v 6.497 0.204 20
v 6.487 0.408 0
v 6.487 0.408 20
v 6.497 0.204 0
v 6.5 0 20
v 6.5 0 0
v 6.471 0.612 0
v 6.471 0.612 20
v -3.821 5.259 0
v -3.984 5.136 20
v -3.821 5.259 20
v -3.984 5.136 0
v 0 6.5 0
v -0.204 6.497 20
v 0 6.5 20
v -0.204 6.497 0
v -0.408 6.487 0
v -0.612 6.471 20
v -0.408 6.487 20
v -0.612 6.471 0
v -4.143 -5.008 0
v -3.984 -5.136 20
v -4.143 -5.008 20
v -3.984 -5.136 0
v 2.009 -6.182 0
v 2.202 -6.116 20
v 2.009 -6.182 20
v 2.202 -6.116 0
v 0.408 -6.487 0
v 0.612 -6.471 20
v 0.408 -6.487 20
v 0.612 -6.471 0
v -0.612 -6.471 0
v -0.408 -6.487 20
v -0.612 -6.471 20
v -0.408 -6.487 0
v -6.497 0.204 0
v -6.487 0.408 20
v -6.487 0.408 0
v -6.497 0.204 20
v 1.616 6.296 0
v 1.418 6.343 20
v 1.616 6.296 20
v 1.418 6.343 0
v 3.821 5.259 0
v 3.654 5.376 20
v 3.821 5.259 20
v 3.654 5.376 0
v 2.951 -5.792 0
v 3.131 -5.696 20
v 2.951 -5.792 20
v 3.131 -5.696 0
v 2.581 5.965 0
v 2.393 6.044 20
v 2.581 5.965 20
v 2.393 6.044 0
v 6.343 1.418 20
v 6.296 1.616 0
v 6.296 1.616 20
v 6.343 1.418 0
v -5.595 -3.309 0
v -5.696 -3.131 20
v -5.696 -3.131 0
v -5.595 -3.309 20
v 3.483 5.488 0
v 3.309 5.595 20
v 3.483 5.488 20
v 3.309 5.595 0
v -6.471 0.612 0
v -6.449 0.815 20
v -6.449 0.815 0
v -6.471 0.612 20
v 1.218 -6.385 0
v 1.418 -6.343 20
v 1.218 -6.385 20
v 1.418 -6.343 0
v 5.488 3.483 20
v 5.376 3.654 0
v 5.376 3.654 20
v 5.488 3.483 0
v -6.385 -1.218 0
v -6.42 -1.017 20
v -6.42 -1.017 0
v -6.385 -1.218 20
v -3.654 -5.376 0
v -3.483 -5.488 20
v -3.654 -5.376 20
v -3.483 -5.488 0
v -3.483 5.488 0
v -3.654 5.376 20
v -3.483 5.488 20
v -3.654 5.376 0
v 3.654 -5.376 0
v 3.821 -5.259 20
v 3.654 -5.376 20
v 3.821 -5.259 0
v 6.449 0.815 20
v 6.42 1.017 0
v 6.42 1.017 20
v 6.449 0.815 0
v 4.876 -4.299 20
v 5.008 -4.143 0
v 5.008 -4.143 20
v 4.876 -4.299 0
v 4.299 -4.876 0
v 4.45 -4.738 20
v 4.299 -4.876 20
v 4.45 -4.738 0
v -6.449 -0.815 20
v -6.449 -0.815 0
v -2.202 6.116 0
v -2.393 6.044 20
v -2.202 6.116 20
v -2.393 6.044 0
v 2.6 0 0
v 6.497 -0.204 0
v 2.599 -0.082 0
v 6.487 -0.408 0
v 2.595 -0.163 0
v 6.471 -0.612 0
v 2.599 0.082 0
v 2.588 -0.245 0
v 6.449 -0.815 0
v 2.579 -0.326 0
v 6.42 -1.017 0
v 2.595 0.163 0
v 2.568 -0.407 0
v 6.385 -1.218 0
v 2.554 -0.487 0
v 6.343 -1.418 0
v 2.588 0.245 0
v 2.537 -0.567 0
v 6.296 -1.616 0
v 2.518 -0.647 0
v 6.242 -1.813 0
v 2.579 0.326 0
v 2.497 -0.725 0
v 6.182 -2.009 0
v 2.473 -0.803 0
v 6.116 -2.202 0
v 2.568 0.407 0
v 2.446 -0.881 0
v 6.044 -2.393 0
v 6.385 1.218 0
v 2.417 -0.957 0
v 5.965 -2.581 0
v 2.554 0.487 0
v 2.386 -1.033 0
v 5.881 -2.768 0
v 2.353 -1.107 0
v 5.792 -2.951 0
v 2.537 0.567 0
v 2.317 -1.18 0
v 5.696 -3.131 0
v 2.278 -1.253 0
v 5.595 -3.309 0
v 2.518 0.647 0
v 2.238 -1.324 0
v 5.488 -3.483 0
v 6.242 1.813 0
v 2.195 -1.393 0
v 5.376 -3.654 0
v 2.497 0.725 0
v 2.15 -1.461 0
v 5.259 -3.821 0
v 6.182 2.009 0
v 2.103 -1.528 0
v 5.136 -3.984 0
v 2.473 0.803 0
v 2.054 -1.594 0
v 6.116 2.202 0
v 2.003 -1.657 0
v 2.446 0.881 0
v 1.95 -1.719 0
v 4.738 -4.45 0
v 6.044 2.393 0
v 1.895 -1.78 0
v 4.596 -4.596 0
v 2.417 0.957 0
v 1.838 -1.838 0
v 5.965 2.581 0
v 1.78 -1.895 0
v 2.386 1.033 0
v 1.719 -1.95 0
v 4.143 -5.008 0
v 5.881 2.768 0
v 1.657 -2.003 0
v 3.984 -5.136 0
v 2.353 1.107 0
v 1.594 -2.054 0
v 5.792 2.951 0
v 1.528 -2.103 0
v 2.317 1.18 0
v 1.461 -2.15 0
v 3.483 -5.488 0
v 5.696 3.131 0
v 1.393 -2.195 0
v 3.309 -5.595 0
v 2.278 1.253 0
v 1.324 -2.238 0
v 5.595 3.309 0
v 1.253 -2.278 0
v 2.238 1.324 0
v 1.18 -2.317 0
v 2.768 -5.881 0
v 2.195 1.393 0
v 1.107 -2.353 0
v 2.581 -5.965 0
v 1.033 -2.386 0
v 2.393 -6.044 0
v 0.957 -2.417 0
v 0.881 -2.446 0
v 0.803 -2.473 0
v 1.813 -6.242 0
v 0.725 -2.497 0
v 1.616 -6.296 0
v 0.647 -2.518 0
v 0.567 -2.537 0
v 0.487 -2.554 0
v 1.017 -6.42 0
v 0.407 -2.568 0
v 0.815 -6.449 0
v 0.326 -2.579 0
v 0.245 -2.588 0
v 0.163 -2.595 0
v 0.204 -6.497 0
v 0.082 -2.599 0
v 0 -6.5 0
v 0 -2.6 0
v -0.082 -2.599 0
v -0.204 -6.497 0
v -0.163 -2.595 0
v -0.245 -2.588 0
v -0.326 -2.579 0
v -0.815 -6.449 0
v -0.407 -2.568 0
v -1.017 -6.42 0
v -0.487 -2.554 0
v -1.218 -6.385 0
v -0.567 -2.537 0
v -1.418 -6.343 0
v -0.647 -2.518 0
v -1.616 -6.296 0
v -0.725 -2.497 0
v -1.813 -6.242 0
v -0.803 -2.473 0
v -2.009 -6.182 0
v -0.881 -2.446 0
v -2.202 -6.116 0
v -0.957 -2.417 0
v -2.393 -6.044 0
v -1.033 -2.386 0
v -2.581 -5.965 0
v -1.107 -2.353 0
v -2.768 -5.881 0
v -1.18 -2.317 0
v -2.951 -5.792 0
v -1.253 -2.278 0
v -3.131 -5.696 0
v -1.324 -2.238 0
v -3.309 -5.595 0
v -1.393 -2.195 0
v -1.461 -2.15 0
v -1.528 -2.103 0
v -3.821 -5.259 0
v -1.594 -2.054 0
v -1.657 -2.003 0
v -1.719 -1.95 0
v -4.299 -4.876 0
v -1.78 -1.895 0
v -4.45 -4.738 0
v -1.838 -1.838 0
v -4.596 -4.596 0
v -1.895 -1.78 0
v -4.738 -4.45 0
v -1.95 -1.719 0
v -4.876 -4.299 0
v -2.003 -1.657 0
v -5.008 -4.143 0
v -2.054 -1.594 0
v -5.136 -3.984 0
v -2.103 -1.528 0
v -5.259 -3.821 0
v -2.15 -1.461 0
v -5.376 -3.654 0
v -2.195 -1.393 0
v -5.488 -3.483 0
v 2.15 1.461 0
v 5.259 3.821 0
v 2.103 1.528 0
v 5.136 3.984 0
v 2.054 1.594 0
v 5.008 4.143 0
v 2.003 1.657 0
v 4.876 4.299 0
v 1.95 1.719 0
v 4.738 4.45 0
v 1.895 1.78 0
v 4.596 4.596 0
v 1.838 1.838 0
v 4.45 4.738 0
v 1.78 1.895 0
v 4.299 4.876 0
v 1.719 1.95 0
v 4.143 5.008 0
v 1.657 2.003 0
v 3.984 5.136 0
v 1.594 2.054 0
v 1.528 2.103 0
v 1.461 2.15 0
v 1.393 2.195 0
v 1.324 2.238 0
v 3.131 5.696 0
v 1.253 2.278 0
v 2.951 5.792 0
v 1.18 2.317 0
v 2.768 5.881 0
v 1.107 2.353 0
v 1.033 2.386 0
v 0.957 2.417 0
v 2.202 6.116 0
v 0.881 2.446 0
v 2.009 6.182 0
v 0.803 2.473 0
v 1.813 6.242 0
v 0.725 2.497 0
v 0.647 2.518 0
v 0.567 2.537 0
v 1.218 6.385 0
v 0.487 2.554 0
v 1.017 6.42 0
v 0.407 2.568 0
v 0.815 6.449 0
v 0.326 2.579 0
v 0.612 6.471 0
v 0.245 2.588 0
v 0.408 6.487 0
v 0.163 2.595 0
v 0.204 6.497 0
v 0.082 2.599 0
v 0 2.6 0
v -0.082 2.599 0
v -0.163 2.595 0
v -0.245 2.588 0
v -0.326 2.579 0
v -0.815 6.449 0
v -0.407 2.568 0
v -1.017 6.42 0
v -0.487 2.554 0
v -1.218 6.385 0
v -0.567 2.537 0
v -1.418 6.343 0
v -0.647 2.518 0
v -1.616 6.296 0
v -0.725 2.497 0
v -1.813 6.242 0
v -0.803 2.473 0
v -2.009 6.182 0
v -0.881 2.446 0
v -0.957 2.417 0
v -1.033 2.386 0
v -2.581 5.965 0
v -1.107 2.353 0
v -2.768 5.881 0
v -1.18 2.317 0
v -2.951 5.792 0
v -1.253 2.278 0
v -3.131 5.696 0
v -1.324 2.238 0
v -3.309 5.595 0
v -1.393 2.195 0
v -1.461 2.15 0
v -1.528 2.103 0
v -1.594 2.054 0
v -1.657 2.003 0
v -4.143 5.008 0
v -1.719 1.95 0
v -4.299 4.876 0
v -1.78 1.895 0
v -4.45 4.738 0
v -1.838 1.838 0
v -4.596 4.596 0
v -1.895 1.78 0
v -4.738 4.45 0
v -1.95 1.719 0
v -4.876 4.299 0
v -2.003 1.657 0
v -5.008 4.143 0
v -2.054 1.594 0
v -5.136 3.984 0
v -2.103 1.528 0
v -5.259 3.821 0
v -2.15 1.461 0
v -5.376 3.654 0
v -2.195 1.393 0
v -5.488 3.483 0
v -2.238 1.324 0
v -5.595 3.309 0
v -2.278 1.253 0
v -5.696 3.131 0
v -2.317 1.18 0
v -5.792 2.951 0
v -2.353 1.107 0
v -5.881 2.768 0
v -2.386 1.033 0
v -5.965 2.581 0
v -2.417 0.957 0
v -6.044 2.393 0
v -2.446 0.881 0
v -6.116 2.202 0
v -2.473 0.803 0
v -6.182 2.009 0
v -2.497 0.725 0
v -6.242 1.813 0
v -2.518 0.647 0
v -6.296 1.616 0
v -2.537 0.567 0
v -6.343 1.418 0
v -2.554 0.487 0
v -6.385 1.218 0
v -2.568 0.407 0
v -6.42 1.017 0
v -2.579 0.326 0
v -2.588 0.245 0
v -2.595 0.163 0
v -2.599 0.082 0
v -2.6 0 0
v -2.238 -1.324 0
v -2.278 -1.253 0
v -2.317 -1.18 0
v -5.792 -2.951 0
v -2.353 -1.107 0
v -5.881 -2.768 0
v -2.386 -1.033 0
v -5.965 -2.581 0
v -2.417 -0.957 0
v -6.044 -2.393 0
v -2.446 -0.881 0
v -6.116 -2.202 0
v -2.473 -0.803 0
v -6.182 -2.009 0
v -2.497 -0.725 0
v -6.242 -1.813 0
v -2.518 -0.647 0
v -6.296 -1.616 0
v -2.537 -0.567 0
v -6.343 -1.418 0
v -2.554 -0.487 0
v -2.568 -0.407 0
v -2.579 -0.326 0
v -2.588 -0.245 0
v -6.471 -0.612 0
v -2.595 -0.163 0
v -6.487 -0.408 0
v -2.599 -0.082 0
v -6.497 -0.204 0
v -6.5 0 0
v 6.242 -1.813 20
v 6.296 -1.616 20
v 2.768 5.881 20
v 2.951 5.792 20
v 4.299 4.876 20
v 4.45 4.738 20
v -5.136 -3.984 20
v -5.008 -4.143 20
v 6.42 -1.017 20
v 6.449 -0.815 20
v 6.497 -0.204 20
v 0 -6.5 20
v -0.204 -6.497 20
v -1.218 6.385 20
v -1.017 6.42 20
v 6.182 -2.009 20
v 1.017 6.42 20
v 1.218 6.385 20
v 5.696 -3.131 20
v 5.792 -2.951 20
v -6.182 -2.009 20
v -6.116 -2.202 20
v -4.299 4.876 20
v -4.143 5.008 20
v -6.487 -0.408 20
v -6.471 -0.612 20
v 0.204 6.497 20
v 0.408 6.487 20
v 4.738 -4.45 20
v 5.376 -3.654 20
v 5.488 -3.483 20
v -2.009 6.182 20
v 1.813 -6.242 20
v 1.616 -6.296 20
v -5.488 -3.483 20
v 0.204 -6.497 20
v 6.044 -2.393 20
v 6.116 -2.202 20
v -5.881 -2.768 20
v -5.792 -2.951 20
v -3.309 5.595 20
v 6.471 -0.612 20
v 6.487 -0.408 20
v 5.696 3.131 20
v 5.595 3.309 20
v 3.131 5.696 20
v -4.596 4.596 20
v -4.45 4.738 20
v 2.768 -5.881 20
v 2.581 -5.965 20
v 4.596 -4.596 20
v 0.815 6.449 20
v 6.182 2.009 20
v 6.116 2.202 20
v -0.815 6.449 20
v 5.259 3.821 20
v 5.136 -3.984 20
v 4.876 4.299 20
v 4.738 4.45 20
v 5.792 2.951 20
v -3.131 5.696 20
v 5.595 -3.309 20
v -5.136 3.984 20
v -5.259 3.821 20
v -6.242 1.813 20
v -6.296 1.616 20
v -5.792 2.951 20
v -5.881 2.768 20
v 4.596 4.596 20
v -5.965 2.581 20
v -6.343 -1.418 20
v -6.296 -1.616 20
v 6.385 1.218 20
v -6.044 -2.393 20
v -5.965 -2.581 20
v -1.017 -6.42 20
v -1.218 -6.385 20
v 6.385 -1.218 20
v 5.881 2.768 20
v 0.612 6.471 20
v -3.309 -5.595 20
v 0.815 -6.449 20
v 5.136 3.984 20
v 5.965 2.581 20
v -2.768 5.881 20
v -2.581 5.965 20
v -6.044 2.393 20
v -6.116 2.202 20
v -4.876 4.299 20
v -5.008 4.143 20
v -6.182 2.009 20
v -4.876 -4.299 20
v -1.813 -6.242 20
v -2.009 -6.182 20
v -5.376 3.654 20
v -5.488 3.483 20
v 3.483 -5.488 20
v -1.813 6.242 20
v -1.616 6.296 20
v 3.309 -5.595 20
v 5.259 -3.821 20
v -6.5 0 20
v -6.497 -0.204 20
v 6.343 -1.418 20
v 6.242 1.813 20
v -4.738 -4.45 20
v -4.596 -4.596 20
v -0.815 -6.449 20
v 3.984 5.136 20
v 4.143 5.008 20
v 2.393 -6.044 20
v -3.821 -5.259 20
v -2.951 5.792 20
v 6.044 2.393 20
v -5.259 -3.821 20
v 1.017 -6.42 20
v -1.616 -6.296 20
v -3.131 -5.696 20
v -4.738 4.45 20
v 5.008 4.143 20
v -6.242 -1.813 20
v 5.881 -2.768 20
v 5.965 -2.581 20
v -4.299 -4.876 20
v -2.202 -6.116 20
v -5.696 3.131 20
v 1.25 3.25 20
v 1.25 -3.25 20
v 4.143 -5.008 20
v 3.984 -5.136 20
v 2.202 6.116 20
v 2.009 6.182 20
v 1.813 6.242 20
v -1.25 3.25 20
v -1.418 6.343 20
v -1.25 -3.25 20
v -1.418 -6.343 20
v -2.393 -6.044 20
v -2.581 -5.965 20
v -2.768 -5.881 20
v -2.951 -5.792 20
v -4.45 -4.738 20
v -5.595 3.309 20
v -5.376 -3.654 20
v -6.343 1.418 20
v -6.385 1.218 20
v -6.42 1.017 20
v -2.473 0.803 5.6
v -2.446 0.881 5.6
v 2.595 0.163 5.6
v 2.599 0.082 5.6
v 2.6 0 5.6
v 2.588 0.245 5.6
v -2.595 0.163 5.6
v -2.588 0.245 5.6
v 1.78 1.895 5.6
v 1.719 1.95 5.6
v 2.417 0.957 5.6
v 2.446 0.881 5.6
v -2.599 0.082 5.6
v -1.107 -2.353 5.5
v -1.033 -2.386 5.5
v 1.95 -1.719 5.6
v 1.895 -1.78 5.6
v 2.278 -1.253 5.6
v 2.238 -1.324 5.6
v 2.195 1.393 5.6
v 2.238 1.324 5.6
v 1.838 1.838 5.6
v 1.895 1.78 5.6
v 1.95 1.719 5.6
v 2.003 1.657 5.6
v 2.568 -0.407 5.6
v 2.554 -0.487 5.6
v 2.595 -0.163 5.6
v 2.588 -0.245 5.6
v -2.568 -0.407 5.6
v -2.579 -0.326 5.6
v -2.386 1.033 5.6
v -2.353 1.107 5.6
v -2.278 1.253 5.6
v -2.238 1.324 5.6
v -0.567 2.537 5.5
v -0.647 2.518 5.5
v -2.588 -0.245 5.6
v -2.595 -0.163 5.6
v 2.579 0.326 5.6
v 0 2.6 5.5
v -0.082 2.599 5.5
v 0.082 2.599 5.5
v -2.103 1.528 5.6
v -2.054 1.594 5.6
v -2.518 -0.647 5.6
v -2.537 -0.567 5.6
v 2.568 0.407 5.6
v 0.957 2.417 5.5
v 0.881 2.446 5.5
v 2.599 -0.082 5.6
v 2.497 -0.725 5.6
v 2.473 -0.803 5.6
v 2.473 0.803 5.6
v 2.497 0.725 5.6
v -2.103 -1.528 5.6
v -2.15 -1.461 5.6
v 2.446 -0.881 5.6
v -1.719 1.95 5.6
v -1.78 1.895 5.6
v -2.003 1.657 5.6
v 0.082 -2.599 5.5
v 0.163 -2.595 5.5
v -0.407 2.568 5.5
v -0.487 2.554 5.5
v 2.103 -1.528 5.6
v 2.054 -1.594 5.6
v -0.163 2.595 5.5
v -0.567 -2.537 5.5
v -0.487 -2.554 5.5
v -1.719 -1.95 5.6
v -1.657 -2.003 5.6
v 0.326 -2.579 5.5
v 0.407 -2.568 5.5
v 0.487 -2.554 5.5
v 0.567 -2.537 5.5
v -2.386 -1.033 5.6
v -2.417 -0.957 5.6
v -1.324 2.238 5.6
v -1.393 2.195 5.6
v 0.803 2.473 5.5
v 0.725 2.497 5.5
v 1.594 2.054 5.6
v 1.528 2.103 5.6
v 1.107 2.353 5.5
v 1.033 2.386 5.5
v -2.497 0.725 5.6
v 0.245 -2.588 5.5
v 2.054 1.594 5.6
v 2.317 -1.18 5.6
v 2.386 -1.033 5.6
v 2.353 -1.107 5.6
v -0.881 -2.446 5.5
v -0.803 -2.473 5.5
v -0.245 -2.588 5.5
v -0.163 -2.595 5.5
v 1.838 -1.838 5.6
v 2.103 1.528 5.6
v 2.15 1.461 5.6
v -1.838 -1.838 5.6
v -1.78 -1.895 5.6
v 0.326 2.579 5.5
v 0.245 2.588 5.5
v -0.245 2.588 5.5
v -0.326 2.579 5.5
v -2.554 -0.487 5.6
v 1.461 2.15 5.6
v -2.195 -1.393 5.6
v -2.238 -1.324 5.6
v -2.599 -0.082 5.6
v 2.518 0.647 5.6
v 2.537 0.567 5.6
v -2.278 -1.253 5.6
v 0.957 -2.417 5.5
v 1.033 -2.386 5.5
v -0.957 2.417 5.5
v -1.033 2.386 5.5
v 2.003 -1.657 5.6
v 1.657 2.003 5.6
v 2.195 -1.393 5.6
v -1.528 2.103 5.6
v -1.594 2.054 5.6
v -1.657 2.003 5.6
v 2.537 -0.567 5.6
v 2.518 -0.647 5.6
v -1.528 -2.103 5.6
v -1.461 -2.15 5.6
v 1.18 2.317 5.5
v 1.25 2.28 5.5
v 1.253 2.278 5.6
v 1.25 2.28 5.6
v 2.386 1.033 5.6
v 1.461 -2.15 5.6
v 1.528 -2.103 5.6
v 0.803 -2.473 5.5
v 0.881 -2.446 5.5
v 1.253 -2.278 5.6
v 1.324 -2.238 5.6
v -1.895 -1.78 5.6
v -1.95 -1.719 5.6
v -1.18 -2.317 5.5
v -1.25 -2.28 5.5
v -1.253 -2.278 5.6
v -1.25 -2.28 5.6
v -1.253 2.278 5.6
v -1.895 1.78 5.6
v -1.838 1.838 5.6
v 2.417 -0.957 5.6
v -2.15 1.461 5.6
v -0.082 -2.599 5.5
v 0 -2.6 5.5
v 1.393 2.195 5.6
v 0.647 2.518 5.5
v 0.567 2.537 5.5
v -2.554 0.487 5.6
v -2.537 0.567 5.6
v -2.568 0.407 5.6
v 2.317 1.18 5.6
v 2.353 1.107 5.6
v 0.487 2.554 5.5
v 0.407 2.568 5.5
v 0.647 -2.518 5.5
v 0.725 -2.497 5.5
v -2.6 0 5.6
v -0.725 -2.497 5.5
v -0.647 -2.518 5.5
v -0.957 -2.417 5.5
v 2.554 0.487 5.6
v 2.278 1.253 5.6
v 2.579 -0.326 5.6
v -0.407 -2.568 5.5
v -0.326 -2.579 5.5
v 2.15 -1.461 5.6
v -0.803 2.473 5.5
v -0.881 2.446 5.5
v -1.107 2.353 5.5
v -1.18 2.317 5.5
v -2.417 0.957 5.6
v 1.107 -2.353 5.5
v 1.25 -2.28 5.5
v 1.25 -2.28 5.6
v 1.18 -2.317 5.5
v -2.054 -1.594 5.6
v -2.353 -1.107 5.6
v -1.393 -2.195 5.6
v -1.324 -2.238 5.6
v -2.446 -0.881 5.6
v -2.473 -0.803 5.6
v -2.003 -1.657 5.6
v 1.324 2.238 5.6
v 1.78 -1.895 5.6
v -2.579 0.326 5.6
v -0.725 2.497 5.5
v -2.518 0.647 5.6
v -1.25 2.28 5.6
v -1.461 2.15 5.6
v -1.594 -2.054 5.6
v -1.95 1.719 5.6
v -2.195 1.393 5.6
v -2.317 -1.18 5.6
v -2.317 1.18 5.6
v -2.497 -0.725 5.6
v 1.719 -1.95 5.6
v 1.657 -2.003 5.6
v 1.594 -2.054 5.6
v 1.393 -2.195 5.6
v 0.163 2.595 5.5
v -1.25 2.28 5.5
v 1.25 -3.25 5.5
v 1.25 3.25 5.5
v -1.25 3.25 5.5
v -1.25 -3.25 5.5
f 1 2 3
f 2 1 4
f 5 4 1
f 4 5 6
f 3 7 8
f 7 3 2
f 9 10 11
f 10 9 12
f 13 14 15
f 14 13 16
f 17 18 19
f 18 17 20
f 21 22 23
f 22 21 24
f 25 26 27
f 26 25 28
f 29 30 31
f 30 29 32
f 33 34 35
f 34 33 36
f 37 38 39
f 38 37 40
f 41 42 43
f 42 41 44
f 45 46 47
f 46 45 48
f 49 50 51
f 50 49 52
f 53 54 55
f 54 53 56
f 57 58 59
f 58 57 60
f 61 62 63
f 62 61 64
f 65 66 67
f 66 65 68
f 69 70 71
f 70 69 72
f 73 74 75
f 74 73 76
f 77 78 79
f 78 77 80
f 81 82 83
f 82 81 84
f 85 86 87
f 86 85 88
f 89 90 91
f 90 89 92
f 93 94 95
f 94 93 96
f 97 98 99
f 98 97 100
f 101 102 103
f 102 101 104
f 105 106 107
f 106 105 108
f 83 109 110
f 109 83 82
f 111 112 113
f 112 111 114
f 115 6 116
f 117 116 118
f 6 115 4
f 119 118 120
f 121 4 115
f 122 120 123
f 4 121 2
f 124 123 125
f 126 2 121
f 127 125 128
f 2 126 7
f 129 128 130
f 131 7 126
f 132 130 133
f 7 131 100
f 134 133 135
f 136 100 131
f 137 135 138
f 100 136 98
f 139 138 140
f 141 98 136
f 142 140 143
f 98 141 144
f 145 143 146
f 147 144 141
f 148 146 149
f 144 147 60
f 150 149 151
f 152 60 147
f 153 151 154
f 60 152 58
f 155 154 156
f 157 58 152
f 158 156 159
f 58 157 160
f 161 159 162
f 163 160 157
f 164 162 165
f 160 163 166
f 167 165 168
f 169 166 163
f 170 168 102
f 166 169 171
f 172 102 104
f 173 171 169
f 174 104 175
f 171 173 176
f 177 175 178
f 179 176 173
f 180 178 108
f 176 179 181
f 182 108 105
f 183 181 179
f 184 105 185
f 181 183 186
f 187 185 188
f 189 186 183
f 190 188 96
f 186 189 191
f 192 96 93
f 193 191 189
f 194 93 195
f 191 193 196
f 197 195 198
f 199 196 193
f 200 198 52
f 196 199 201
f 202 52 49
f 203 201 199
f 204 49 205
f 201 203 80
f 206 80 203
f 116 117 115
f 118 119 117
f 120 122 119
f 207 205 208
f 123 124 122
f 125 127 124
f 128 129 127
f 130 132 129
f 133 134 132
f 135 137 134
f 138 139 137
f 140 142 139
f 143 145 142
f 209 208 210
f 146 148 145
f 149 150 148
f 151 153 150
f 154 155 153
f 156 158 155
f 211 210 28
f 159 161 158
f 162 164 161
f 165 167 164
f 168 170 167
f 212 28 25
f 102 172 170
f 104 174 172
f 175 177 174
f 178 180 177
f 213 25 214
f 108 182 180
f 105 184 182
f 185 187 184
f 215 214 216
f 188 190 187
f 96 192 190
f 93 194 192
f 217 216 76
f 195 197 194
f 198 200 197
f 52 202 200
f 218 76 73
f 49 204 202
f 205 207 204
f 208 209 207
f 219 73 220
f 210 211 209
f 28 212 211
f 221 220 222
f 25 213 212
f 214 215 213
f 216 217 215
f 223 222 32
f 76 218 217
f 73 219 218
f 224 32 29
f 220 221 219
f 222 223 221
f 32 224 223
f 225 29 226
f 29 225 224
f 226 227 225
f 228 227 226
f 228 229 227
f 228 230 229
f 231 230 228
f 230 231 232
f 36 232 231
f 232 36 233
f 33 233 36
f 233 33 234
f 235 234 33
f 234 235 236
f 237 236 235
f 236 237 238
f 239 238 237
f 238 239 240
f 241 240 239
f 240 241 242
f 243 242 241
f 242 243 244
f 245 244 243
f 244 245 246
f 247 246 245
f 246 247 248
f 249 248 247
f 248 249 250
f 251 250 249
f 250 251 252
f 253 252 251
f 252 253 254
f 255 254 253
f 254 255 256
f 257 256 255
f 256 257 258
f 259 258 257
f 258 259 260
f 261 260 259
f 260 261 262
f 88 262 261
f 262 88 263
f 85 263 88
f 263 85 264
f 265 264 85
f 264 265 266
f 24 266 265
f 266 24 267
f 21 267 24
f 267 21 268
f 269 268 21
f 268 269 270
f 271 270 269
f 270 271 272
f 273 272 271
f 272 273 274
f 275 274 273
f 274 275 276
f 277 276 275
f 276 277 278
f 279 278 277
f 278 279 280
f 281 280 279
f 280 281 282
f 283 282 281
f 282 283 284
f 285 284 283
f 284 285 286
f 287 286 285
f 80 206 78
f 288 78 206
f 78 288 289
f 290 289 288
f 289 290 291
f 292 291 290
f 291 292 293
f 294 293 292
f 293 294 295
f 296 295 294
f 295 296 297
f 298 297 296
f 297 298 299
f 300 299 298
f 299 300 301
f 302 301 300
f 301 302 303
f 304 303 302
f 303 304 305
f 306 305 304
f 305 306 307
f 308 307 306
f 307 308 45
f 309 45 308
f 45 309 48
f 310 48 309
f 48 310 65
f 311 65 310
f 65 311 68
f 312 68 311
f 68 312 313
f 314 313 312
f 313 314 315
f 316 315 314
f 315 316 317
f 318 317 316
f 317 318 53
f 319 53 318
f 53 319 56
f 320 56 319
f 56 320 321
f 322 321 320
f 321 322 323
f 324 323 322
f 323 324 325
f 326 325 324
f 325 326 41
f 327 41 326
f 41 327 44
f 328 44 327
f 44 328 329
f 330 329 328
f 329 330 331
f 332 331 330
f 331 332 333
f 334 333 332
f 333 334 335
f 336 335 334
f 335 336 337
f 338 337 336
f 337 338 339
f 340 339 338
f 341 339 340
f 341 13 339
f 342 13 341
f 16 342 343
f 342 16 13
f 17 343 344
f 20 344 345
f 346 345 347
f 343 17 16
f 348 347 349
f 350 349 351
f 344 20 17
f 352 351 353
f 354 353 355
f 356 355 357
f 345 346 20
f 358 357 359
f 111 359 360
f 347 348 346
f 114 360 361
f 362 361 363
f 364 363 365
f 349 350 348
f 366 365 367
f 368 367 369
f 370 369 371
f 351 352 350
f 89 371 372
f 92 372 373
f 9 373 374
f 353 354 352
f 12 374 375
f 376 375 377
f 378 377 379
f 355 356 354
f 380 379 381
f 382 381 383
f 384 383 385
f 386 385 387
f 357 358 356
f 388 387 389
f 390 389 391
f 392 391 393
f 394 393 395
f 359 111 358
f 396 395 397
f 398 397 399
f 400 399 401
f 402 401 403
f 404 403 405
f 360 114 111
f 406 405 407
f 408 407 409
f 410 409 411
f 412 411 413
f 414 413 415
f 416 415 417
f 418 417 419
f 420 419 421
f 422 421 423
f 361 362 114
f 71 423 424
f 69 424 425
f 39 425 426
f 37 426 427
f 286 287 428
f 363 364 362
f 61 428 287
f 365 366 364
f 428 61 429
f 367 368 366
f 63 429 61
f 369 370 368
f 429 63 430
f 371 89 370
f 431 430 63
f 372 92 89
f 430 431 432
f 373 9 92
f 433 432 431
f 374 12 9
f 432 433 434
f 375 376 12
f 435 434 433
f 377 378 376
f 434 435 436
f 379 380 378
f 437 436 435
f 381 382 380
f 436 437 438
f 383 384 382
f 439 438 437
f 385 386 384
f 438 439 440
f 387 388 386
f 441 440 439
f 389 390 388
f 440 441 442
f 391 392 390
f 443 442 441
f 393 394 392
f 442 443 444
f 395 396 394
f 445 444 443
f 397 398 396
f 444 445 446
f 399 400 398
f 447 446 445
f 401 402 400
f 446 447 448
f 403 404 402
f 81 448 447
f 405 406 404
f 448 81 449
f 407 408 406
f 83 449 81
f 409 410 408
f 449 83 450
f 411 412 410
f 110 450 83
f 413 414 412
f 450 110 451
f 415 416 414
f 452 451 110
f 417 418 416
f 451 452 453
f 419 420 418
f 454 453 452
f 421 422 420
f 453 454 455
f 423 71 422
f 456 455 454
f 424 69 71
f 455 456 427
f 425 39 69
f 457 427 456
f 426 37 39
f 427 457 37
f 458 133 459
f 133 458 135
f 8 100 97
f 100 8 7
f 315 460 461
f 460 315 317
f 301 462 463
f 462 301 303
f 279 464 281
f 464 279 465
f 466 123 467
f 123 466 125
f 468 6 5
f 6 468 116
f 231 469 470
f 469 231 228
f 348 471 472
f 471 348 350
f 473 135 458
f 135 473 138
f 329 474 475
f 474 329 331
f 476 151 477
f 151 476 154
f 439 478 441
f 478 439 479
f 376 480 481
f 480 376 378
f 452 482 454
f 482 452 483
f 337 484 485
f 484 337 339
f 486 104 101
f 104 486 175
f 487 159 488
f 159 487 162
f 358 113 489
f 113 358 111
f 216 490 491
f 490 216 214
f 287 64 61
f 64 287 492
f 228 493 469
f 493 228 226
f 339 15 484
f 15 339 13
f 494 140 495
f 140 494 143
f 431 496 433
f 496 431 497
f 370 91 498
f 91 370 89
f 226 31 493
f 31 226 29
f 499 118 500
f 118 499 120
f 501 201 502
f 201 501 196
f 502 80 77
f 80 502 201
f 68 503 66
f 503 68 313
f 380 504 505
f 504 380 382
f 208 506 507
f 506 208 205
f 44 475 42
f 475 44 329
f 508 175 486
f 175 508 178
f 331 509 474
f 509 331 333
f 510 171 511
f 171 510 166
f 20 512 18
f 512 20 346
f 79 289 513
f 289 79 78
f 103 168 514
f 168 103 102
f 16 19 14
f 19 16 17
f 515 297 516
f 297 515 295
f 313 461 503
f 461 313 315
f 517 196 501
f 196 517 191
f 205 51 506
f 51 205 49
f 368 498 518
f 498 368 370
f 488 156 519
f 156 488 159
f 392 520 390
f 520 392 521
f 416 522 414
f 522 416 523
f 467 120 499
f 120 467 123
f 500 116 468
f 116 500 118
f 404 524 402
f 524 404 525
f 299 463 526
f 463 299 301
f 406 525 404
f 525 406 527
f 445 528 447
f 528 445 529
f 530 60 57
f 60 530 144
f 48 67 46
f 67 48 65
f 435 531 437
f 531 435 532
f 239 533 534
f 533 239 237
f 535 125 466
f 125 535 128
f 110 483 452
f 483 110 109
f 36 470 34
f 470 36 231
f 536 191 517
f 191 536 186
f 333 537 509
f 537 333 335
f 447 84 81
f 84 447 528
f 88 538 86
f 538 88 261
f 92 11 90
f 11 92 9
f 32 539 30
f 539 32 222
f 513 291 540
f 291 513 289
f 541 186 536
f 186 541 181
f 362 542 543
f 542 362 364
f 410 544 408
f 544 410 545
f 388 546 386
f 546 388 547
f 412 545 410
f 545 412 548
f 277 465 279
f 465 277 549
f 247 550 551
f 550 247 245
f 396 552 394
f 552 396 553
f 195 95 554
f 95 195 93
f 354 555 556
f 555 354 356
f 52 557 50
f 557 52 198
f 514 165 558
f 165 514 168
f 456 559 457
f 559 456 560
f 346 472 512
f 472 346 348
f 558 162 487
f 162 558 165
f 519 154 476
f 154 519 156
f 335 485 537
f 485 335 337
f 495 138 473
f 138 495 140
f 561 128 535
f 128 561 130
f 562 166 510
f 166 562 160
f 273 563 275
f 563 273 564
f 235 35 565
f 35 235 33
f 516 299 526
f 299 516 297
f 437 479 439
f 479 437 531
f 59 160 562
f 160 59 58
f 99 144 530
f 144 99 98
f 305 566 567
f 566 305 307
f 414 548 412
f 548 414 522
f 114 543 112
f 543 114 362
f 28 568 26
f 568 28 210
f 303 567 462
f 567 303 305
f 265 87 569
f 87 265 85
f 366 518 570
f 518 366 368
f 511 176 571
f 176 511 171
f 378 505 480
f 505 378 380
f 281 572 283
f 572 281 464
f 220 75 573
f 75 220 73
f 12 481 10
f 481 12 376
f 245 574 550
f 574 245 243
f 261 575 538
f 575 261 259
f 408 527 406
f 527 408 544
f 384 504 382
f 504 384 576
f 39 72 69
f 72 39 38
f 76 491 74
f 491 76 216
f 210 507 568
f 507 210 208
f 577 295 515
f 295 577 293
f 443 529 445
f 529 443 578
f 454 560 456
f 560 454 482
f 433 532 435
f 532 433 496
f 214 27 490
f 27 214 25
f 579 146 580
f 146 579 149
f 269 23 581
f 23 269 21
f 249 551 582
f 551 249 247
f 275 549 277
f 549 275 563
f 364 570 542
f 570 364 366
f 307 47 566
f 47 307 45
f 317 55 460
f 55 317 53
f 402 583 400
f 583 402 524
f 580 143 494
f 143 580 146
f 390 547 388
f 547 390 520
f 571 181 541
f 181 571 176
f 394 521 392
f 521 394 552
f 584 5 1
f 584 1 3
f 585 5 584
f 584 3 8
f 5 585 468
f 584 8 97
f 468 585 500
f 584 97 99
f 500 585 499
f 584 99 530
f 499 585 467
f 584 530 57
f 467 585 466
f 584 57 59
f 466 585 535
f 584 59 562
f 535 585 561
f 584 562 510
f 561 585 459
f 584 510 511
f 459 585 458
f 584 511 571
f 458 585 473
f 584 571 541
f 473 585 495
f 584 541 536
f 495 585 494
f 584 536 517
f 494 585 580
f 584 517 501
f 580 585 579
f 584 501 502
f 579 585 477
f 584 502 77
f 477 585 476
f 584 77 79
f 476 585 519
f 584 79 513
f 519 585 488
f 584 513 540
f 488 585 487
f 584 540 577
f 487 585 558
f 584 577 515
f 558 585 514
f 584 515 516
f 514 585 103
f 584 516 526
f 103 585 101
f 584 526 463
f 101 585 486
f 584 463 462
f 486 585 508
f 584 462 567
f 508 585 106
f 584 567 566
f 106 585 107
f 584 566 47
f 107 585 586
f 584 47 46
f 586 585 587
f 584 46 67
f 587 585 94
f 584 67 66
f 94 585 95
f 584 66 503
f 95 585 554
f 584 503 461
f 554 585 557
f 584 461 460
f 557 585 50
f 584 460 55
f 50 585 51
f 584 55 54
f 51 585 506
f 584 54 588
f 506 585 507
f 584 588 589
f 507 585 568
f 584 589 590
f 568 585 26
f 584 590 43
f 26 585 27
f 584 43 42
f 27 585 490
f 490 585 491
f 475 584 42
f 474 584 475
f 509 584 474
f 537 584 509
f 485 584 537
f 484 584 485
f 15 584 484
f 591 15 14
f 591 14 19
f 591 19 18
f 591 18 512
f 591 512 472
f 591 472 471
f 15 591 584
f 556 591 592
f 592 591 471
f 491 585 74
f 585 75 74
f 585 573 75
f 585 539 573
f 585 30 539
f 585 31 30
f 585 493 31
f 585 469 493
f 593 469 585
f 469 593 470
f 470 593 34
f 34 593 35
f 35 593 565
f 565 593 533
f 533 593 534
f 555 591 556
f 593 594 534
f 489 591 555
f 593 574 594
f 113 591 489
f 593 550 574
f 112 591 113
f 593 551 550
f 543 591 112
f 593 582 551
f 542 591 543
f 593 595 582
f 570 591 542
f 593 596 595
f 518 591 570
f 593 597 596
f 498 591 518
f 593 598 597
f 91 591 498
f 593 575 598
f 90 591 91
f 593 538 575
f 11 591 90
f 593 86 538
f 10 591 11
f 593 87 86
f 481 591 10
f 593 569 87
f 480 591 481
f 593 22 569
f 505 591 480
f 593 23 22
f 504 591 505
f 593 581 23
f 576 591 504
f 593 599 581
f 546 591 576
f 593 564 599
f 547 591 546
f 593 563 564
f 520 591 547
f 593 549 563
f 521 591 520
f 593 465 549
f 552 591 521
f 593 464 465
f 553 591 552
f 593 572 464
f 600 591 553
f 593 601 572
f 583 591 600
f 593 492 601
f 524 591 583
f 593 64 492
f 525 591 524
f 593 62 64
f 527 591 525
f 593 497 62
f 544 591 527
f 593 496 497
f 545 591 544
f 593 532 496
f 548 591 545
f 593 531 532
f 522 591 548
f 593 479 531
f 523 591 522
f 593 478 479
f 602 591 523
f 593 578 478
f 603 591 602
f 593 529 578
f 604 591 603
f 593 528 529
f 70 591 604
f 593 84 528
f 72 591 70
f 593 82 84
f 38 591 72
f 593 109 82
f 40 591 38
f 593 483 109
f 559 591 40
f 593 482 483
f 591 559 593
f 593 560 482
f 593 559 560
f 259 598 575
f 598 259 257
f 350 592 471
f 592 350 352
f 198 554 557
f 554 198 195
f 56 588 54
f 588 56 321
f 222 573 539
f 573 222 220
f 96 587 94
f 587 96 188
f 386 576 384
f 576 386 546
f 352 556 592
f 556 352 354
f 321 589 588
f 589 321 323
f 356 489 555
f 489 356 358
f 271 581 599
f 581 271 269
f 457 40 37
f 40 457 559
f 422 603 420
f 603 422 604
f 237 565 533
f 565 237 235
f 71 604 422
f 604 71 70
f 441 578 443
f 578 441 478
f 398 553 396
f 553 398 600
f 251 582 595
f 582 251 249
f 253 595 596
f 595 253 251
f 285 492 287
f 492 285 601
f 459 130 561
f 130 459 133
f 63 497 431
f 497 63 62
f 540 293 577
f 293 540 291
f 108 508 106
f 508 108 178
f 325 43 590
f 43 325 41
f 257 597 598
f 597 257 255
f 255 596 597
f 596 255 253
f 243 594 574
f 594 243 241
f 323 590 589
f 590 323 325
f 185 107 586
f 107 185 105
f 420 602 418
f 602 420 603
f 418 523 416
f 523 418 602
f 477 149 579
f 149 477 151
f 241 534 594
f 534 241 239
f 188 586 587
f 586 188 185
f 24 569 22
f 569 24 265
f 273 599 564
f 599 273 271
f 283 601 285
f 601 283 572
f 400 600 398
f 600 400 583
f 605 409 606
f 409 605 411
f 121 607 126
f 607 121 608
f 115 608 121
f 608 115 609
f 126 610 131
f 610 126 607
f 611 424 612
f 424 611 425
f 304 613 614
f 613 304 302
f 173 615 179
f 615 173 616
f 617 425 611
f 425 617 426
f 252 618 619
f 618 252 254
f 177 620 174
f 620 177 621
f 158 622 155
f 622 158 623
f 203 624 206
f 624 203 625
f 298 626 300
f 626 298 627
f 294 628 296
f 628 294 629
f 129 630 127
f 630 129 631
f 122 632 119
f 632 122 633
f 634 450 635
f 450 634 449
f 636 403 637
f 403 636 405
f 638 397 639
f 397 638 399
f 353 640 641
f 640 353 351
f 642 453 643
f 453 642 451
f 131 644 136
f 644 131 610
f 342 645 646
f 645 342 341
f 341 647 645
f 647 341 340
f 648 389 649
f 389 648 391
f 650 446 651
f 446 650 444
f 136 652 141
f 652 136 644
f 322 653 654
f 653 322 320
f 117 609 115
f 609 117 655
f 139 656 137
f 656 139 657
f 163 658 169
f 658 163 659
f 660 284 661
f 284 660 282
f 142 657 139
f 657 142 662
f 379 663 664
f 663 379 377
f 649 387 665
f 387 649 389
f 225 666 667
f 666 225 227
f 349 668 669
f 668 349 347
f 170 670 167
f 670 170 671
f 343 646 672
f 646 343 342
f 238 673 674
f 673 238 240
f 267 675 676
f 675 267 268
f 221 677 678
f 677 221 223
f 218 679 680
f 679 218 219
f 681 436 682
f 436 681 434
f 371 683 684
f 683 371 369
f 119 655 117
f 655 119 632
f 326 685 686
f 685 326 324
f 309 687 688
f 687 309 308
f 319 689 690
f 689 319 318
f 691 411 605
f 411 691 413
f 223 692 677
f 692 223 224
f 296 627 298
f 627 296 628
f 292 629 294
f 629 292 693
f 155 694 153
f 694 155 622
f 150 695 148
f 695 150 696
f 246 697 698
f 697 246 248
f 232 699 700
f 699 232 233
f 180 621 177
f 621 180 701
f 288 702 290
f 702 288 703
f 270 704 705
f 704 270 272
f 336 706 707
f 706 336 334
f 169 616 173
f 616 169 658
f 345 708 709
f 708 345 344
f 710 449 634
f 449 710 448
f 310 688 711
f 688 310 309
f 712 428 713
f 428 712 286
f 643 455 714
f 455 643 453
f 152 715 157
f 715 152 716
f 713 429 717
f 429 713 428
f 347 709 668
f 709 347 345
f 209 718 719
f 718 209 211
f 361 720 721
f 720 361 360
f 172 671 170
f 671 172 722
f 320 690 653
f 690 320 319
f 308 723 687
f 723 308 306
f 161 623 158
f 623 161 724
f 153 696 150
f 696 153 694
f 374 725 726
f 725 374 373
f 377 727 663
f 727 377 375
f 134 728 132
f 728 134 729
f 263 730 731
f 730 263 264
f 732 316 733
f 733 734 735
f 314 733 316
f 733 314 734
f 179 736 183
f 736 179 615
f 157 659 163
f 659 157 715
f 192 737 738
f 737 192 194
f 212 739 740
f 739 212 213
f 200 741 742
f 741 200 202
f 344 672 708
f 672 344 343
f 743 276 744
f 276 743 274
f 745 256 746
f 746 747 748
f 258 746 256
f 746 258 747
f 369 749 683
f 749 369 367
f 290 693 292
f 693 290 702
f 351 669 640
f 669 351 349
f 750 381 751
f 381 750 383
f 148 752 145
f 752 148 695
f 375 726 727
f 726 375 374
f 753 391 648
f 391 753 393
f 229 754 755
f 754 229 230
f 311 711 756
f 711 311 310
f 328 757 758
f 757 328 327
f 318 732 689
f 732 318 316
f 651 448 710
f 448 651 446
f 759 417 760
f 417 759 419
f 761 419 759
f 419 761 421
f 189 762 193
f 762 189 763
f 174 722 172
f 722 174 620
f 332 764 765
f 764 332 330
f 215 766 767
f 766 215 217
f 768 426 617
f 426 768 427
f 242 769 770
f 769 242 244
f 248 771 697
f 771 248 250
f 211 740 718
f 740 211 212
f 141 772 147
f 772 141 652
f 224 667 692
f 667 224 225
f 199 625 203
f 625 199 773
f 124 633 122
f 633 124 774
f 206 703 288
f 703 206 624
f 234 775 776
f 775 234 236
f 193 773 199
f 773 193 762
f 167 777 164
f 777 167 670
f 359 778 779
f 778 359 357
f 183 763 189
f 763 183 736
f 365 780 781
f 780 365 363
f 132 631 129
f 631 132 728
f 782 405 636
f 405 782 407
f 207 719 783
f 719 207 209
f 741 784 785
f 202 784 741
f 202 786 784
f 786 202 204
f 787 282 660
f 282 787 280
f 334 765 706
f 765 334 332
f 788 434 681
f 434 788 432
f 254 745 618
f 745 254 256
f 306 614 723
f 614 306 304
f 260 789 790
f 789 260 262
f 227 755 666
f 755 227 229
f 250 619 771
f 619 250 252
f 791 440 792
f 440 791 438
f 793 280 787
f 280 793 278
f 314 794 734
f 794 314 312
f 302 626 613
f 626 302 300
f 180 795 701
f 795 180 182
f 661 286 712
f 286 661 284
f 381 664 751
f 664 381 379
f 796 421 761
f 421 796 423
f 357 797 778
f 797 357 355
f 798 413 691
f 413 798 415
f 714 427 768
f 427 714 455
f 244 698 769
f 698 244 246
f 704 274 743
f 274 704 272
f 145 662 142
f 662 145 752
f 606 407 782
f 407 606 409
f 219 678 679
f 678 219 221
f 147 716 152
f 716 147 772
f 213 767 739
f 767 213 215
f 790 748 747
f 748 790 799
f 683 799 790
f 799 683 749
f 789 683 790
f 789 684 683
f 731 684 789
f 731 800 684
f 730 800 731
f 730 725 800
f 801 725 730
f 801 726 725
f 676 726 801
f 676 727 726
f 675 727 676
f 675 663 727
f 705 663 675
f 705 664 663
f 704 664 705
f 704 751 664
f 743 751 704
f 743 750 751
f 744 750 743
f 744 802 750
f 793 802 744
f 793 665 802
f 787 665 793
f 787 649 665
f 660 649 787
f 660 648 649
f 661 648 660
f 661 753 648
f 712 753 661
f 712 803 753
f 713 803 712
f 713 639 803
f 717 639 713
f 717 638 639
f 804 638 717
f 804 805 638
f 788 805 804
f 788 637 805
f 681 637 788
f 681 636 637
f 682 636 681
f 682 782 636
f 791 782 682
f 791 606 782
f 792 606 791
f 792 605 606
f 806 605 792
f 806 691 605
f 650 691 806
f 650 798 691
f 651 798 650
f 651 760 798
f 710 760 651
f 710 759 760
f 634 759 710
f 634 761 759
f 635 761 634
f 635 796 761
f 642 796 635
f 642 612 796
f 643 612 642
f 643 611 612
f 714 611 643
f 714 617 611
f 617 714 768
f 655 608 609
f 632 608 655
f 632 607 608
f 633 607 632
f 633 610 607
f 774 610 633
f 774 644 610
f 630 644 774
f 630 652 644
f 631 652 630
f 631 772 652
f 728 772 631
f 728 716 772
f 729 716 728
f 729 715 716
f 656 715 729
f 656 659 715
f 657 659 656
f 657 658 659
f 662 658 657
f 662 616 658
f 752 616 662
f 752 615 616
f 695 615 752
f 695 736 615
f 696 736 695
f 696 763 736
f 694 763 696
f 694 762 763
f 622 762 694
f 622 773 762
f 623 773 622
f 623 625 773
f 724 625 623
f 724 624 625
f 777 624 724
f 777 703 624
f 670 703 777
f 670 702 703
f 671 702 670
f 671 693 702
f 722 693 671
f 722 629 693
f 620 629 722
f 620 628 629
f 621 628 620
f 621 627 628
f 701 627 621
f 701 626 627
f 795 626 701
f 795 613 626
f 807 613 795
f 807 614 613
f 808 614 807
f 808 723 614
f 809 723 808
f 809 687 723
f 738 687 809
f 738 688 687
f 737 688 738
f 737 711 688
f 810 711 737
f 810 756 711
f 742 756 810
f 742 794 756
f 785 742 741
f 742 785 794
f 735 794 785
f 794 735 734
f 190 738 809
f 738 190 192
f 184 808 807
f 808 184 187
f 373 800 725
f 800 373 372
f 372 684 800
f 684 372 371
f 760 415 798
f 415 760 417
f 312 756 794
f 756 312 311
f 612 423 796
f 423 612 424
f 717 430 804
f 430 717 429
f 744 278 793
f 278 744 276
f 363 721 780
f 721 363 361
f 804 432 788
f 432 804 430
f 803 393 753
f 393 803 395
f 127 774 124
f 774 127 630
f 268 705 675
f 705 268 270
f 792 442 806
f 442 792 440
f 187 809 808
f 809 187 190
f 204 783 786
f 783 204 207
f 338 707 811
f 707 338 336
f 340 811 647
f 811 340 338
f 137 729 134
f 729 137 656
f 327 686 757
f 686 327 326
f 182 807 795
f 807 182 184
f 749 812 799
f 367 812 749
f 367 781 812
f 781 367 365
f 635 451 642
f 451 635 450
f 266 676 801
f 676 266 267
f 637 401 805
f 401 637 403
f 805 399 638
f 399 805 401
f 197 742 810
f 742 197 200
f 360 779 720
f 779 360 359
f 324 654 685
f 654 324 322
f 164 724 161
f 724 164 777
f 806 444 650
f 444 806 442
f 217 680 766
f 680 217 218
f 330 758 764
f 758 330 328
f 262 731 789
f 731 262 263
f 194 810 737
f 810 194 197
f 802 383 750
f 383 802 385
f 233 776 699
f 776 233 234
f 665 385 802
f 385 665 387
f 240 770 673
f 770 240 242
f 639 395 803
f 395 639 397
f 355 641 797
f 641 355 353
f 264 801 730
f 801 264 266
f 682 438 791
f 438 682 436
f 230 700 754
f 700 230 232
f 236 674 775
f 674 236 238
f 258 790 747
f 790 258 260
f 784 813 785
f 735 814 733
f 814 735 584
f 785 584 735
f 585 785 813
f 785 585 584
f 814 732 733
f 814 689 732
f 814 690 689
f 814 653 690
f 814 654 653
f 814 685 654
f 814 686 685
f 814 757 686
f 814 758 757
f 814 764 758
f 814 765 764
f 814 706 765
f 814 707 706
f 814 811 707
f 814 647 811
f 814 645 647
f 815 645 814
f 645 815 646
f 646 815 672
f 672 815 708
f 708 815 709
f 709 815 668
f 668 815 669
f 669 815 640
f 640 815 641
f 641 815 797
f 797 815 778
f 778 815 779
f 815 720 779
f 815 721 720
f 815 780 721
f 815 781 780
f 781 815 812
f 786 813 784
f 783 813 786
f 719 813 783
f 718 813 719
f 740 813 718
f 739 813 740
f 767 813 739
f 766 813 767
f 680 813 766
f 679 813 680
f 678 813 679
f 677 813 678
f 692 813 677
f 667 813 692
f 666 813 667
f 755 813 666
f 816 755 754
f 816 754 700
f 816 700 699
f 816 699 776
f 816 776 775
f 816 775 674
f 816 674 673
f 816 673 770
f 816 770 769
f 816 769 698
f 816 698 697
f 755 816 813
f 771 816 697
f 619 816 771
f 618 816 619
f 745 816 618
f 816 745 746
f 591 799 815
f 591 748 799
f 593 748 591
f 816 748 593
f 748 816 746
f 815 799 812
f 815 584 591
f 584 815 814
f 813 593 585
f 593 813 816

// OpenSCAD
$fn = 200;
difference(){
    cylinder(h=20,r1=6.5,r2=6.5);
    translate([0,0,-1]) cylinder(h=6.6,r1=2.6,r2=2.6);
    translate([-1.25,-3.25,5.5]) cube([2.5,6.5,16.0]);
}
